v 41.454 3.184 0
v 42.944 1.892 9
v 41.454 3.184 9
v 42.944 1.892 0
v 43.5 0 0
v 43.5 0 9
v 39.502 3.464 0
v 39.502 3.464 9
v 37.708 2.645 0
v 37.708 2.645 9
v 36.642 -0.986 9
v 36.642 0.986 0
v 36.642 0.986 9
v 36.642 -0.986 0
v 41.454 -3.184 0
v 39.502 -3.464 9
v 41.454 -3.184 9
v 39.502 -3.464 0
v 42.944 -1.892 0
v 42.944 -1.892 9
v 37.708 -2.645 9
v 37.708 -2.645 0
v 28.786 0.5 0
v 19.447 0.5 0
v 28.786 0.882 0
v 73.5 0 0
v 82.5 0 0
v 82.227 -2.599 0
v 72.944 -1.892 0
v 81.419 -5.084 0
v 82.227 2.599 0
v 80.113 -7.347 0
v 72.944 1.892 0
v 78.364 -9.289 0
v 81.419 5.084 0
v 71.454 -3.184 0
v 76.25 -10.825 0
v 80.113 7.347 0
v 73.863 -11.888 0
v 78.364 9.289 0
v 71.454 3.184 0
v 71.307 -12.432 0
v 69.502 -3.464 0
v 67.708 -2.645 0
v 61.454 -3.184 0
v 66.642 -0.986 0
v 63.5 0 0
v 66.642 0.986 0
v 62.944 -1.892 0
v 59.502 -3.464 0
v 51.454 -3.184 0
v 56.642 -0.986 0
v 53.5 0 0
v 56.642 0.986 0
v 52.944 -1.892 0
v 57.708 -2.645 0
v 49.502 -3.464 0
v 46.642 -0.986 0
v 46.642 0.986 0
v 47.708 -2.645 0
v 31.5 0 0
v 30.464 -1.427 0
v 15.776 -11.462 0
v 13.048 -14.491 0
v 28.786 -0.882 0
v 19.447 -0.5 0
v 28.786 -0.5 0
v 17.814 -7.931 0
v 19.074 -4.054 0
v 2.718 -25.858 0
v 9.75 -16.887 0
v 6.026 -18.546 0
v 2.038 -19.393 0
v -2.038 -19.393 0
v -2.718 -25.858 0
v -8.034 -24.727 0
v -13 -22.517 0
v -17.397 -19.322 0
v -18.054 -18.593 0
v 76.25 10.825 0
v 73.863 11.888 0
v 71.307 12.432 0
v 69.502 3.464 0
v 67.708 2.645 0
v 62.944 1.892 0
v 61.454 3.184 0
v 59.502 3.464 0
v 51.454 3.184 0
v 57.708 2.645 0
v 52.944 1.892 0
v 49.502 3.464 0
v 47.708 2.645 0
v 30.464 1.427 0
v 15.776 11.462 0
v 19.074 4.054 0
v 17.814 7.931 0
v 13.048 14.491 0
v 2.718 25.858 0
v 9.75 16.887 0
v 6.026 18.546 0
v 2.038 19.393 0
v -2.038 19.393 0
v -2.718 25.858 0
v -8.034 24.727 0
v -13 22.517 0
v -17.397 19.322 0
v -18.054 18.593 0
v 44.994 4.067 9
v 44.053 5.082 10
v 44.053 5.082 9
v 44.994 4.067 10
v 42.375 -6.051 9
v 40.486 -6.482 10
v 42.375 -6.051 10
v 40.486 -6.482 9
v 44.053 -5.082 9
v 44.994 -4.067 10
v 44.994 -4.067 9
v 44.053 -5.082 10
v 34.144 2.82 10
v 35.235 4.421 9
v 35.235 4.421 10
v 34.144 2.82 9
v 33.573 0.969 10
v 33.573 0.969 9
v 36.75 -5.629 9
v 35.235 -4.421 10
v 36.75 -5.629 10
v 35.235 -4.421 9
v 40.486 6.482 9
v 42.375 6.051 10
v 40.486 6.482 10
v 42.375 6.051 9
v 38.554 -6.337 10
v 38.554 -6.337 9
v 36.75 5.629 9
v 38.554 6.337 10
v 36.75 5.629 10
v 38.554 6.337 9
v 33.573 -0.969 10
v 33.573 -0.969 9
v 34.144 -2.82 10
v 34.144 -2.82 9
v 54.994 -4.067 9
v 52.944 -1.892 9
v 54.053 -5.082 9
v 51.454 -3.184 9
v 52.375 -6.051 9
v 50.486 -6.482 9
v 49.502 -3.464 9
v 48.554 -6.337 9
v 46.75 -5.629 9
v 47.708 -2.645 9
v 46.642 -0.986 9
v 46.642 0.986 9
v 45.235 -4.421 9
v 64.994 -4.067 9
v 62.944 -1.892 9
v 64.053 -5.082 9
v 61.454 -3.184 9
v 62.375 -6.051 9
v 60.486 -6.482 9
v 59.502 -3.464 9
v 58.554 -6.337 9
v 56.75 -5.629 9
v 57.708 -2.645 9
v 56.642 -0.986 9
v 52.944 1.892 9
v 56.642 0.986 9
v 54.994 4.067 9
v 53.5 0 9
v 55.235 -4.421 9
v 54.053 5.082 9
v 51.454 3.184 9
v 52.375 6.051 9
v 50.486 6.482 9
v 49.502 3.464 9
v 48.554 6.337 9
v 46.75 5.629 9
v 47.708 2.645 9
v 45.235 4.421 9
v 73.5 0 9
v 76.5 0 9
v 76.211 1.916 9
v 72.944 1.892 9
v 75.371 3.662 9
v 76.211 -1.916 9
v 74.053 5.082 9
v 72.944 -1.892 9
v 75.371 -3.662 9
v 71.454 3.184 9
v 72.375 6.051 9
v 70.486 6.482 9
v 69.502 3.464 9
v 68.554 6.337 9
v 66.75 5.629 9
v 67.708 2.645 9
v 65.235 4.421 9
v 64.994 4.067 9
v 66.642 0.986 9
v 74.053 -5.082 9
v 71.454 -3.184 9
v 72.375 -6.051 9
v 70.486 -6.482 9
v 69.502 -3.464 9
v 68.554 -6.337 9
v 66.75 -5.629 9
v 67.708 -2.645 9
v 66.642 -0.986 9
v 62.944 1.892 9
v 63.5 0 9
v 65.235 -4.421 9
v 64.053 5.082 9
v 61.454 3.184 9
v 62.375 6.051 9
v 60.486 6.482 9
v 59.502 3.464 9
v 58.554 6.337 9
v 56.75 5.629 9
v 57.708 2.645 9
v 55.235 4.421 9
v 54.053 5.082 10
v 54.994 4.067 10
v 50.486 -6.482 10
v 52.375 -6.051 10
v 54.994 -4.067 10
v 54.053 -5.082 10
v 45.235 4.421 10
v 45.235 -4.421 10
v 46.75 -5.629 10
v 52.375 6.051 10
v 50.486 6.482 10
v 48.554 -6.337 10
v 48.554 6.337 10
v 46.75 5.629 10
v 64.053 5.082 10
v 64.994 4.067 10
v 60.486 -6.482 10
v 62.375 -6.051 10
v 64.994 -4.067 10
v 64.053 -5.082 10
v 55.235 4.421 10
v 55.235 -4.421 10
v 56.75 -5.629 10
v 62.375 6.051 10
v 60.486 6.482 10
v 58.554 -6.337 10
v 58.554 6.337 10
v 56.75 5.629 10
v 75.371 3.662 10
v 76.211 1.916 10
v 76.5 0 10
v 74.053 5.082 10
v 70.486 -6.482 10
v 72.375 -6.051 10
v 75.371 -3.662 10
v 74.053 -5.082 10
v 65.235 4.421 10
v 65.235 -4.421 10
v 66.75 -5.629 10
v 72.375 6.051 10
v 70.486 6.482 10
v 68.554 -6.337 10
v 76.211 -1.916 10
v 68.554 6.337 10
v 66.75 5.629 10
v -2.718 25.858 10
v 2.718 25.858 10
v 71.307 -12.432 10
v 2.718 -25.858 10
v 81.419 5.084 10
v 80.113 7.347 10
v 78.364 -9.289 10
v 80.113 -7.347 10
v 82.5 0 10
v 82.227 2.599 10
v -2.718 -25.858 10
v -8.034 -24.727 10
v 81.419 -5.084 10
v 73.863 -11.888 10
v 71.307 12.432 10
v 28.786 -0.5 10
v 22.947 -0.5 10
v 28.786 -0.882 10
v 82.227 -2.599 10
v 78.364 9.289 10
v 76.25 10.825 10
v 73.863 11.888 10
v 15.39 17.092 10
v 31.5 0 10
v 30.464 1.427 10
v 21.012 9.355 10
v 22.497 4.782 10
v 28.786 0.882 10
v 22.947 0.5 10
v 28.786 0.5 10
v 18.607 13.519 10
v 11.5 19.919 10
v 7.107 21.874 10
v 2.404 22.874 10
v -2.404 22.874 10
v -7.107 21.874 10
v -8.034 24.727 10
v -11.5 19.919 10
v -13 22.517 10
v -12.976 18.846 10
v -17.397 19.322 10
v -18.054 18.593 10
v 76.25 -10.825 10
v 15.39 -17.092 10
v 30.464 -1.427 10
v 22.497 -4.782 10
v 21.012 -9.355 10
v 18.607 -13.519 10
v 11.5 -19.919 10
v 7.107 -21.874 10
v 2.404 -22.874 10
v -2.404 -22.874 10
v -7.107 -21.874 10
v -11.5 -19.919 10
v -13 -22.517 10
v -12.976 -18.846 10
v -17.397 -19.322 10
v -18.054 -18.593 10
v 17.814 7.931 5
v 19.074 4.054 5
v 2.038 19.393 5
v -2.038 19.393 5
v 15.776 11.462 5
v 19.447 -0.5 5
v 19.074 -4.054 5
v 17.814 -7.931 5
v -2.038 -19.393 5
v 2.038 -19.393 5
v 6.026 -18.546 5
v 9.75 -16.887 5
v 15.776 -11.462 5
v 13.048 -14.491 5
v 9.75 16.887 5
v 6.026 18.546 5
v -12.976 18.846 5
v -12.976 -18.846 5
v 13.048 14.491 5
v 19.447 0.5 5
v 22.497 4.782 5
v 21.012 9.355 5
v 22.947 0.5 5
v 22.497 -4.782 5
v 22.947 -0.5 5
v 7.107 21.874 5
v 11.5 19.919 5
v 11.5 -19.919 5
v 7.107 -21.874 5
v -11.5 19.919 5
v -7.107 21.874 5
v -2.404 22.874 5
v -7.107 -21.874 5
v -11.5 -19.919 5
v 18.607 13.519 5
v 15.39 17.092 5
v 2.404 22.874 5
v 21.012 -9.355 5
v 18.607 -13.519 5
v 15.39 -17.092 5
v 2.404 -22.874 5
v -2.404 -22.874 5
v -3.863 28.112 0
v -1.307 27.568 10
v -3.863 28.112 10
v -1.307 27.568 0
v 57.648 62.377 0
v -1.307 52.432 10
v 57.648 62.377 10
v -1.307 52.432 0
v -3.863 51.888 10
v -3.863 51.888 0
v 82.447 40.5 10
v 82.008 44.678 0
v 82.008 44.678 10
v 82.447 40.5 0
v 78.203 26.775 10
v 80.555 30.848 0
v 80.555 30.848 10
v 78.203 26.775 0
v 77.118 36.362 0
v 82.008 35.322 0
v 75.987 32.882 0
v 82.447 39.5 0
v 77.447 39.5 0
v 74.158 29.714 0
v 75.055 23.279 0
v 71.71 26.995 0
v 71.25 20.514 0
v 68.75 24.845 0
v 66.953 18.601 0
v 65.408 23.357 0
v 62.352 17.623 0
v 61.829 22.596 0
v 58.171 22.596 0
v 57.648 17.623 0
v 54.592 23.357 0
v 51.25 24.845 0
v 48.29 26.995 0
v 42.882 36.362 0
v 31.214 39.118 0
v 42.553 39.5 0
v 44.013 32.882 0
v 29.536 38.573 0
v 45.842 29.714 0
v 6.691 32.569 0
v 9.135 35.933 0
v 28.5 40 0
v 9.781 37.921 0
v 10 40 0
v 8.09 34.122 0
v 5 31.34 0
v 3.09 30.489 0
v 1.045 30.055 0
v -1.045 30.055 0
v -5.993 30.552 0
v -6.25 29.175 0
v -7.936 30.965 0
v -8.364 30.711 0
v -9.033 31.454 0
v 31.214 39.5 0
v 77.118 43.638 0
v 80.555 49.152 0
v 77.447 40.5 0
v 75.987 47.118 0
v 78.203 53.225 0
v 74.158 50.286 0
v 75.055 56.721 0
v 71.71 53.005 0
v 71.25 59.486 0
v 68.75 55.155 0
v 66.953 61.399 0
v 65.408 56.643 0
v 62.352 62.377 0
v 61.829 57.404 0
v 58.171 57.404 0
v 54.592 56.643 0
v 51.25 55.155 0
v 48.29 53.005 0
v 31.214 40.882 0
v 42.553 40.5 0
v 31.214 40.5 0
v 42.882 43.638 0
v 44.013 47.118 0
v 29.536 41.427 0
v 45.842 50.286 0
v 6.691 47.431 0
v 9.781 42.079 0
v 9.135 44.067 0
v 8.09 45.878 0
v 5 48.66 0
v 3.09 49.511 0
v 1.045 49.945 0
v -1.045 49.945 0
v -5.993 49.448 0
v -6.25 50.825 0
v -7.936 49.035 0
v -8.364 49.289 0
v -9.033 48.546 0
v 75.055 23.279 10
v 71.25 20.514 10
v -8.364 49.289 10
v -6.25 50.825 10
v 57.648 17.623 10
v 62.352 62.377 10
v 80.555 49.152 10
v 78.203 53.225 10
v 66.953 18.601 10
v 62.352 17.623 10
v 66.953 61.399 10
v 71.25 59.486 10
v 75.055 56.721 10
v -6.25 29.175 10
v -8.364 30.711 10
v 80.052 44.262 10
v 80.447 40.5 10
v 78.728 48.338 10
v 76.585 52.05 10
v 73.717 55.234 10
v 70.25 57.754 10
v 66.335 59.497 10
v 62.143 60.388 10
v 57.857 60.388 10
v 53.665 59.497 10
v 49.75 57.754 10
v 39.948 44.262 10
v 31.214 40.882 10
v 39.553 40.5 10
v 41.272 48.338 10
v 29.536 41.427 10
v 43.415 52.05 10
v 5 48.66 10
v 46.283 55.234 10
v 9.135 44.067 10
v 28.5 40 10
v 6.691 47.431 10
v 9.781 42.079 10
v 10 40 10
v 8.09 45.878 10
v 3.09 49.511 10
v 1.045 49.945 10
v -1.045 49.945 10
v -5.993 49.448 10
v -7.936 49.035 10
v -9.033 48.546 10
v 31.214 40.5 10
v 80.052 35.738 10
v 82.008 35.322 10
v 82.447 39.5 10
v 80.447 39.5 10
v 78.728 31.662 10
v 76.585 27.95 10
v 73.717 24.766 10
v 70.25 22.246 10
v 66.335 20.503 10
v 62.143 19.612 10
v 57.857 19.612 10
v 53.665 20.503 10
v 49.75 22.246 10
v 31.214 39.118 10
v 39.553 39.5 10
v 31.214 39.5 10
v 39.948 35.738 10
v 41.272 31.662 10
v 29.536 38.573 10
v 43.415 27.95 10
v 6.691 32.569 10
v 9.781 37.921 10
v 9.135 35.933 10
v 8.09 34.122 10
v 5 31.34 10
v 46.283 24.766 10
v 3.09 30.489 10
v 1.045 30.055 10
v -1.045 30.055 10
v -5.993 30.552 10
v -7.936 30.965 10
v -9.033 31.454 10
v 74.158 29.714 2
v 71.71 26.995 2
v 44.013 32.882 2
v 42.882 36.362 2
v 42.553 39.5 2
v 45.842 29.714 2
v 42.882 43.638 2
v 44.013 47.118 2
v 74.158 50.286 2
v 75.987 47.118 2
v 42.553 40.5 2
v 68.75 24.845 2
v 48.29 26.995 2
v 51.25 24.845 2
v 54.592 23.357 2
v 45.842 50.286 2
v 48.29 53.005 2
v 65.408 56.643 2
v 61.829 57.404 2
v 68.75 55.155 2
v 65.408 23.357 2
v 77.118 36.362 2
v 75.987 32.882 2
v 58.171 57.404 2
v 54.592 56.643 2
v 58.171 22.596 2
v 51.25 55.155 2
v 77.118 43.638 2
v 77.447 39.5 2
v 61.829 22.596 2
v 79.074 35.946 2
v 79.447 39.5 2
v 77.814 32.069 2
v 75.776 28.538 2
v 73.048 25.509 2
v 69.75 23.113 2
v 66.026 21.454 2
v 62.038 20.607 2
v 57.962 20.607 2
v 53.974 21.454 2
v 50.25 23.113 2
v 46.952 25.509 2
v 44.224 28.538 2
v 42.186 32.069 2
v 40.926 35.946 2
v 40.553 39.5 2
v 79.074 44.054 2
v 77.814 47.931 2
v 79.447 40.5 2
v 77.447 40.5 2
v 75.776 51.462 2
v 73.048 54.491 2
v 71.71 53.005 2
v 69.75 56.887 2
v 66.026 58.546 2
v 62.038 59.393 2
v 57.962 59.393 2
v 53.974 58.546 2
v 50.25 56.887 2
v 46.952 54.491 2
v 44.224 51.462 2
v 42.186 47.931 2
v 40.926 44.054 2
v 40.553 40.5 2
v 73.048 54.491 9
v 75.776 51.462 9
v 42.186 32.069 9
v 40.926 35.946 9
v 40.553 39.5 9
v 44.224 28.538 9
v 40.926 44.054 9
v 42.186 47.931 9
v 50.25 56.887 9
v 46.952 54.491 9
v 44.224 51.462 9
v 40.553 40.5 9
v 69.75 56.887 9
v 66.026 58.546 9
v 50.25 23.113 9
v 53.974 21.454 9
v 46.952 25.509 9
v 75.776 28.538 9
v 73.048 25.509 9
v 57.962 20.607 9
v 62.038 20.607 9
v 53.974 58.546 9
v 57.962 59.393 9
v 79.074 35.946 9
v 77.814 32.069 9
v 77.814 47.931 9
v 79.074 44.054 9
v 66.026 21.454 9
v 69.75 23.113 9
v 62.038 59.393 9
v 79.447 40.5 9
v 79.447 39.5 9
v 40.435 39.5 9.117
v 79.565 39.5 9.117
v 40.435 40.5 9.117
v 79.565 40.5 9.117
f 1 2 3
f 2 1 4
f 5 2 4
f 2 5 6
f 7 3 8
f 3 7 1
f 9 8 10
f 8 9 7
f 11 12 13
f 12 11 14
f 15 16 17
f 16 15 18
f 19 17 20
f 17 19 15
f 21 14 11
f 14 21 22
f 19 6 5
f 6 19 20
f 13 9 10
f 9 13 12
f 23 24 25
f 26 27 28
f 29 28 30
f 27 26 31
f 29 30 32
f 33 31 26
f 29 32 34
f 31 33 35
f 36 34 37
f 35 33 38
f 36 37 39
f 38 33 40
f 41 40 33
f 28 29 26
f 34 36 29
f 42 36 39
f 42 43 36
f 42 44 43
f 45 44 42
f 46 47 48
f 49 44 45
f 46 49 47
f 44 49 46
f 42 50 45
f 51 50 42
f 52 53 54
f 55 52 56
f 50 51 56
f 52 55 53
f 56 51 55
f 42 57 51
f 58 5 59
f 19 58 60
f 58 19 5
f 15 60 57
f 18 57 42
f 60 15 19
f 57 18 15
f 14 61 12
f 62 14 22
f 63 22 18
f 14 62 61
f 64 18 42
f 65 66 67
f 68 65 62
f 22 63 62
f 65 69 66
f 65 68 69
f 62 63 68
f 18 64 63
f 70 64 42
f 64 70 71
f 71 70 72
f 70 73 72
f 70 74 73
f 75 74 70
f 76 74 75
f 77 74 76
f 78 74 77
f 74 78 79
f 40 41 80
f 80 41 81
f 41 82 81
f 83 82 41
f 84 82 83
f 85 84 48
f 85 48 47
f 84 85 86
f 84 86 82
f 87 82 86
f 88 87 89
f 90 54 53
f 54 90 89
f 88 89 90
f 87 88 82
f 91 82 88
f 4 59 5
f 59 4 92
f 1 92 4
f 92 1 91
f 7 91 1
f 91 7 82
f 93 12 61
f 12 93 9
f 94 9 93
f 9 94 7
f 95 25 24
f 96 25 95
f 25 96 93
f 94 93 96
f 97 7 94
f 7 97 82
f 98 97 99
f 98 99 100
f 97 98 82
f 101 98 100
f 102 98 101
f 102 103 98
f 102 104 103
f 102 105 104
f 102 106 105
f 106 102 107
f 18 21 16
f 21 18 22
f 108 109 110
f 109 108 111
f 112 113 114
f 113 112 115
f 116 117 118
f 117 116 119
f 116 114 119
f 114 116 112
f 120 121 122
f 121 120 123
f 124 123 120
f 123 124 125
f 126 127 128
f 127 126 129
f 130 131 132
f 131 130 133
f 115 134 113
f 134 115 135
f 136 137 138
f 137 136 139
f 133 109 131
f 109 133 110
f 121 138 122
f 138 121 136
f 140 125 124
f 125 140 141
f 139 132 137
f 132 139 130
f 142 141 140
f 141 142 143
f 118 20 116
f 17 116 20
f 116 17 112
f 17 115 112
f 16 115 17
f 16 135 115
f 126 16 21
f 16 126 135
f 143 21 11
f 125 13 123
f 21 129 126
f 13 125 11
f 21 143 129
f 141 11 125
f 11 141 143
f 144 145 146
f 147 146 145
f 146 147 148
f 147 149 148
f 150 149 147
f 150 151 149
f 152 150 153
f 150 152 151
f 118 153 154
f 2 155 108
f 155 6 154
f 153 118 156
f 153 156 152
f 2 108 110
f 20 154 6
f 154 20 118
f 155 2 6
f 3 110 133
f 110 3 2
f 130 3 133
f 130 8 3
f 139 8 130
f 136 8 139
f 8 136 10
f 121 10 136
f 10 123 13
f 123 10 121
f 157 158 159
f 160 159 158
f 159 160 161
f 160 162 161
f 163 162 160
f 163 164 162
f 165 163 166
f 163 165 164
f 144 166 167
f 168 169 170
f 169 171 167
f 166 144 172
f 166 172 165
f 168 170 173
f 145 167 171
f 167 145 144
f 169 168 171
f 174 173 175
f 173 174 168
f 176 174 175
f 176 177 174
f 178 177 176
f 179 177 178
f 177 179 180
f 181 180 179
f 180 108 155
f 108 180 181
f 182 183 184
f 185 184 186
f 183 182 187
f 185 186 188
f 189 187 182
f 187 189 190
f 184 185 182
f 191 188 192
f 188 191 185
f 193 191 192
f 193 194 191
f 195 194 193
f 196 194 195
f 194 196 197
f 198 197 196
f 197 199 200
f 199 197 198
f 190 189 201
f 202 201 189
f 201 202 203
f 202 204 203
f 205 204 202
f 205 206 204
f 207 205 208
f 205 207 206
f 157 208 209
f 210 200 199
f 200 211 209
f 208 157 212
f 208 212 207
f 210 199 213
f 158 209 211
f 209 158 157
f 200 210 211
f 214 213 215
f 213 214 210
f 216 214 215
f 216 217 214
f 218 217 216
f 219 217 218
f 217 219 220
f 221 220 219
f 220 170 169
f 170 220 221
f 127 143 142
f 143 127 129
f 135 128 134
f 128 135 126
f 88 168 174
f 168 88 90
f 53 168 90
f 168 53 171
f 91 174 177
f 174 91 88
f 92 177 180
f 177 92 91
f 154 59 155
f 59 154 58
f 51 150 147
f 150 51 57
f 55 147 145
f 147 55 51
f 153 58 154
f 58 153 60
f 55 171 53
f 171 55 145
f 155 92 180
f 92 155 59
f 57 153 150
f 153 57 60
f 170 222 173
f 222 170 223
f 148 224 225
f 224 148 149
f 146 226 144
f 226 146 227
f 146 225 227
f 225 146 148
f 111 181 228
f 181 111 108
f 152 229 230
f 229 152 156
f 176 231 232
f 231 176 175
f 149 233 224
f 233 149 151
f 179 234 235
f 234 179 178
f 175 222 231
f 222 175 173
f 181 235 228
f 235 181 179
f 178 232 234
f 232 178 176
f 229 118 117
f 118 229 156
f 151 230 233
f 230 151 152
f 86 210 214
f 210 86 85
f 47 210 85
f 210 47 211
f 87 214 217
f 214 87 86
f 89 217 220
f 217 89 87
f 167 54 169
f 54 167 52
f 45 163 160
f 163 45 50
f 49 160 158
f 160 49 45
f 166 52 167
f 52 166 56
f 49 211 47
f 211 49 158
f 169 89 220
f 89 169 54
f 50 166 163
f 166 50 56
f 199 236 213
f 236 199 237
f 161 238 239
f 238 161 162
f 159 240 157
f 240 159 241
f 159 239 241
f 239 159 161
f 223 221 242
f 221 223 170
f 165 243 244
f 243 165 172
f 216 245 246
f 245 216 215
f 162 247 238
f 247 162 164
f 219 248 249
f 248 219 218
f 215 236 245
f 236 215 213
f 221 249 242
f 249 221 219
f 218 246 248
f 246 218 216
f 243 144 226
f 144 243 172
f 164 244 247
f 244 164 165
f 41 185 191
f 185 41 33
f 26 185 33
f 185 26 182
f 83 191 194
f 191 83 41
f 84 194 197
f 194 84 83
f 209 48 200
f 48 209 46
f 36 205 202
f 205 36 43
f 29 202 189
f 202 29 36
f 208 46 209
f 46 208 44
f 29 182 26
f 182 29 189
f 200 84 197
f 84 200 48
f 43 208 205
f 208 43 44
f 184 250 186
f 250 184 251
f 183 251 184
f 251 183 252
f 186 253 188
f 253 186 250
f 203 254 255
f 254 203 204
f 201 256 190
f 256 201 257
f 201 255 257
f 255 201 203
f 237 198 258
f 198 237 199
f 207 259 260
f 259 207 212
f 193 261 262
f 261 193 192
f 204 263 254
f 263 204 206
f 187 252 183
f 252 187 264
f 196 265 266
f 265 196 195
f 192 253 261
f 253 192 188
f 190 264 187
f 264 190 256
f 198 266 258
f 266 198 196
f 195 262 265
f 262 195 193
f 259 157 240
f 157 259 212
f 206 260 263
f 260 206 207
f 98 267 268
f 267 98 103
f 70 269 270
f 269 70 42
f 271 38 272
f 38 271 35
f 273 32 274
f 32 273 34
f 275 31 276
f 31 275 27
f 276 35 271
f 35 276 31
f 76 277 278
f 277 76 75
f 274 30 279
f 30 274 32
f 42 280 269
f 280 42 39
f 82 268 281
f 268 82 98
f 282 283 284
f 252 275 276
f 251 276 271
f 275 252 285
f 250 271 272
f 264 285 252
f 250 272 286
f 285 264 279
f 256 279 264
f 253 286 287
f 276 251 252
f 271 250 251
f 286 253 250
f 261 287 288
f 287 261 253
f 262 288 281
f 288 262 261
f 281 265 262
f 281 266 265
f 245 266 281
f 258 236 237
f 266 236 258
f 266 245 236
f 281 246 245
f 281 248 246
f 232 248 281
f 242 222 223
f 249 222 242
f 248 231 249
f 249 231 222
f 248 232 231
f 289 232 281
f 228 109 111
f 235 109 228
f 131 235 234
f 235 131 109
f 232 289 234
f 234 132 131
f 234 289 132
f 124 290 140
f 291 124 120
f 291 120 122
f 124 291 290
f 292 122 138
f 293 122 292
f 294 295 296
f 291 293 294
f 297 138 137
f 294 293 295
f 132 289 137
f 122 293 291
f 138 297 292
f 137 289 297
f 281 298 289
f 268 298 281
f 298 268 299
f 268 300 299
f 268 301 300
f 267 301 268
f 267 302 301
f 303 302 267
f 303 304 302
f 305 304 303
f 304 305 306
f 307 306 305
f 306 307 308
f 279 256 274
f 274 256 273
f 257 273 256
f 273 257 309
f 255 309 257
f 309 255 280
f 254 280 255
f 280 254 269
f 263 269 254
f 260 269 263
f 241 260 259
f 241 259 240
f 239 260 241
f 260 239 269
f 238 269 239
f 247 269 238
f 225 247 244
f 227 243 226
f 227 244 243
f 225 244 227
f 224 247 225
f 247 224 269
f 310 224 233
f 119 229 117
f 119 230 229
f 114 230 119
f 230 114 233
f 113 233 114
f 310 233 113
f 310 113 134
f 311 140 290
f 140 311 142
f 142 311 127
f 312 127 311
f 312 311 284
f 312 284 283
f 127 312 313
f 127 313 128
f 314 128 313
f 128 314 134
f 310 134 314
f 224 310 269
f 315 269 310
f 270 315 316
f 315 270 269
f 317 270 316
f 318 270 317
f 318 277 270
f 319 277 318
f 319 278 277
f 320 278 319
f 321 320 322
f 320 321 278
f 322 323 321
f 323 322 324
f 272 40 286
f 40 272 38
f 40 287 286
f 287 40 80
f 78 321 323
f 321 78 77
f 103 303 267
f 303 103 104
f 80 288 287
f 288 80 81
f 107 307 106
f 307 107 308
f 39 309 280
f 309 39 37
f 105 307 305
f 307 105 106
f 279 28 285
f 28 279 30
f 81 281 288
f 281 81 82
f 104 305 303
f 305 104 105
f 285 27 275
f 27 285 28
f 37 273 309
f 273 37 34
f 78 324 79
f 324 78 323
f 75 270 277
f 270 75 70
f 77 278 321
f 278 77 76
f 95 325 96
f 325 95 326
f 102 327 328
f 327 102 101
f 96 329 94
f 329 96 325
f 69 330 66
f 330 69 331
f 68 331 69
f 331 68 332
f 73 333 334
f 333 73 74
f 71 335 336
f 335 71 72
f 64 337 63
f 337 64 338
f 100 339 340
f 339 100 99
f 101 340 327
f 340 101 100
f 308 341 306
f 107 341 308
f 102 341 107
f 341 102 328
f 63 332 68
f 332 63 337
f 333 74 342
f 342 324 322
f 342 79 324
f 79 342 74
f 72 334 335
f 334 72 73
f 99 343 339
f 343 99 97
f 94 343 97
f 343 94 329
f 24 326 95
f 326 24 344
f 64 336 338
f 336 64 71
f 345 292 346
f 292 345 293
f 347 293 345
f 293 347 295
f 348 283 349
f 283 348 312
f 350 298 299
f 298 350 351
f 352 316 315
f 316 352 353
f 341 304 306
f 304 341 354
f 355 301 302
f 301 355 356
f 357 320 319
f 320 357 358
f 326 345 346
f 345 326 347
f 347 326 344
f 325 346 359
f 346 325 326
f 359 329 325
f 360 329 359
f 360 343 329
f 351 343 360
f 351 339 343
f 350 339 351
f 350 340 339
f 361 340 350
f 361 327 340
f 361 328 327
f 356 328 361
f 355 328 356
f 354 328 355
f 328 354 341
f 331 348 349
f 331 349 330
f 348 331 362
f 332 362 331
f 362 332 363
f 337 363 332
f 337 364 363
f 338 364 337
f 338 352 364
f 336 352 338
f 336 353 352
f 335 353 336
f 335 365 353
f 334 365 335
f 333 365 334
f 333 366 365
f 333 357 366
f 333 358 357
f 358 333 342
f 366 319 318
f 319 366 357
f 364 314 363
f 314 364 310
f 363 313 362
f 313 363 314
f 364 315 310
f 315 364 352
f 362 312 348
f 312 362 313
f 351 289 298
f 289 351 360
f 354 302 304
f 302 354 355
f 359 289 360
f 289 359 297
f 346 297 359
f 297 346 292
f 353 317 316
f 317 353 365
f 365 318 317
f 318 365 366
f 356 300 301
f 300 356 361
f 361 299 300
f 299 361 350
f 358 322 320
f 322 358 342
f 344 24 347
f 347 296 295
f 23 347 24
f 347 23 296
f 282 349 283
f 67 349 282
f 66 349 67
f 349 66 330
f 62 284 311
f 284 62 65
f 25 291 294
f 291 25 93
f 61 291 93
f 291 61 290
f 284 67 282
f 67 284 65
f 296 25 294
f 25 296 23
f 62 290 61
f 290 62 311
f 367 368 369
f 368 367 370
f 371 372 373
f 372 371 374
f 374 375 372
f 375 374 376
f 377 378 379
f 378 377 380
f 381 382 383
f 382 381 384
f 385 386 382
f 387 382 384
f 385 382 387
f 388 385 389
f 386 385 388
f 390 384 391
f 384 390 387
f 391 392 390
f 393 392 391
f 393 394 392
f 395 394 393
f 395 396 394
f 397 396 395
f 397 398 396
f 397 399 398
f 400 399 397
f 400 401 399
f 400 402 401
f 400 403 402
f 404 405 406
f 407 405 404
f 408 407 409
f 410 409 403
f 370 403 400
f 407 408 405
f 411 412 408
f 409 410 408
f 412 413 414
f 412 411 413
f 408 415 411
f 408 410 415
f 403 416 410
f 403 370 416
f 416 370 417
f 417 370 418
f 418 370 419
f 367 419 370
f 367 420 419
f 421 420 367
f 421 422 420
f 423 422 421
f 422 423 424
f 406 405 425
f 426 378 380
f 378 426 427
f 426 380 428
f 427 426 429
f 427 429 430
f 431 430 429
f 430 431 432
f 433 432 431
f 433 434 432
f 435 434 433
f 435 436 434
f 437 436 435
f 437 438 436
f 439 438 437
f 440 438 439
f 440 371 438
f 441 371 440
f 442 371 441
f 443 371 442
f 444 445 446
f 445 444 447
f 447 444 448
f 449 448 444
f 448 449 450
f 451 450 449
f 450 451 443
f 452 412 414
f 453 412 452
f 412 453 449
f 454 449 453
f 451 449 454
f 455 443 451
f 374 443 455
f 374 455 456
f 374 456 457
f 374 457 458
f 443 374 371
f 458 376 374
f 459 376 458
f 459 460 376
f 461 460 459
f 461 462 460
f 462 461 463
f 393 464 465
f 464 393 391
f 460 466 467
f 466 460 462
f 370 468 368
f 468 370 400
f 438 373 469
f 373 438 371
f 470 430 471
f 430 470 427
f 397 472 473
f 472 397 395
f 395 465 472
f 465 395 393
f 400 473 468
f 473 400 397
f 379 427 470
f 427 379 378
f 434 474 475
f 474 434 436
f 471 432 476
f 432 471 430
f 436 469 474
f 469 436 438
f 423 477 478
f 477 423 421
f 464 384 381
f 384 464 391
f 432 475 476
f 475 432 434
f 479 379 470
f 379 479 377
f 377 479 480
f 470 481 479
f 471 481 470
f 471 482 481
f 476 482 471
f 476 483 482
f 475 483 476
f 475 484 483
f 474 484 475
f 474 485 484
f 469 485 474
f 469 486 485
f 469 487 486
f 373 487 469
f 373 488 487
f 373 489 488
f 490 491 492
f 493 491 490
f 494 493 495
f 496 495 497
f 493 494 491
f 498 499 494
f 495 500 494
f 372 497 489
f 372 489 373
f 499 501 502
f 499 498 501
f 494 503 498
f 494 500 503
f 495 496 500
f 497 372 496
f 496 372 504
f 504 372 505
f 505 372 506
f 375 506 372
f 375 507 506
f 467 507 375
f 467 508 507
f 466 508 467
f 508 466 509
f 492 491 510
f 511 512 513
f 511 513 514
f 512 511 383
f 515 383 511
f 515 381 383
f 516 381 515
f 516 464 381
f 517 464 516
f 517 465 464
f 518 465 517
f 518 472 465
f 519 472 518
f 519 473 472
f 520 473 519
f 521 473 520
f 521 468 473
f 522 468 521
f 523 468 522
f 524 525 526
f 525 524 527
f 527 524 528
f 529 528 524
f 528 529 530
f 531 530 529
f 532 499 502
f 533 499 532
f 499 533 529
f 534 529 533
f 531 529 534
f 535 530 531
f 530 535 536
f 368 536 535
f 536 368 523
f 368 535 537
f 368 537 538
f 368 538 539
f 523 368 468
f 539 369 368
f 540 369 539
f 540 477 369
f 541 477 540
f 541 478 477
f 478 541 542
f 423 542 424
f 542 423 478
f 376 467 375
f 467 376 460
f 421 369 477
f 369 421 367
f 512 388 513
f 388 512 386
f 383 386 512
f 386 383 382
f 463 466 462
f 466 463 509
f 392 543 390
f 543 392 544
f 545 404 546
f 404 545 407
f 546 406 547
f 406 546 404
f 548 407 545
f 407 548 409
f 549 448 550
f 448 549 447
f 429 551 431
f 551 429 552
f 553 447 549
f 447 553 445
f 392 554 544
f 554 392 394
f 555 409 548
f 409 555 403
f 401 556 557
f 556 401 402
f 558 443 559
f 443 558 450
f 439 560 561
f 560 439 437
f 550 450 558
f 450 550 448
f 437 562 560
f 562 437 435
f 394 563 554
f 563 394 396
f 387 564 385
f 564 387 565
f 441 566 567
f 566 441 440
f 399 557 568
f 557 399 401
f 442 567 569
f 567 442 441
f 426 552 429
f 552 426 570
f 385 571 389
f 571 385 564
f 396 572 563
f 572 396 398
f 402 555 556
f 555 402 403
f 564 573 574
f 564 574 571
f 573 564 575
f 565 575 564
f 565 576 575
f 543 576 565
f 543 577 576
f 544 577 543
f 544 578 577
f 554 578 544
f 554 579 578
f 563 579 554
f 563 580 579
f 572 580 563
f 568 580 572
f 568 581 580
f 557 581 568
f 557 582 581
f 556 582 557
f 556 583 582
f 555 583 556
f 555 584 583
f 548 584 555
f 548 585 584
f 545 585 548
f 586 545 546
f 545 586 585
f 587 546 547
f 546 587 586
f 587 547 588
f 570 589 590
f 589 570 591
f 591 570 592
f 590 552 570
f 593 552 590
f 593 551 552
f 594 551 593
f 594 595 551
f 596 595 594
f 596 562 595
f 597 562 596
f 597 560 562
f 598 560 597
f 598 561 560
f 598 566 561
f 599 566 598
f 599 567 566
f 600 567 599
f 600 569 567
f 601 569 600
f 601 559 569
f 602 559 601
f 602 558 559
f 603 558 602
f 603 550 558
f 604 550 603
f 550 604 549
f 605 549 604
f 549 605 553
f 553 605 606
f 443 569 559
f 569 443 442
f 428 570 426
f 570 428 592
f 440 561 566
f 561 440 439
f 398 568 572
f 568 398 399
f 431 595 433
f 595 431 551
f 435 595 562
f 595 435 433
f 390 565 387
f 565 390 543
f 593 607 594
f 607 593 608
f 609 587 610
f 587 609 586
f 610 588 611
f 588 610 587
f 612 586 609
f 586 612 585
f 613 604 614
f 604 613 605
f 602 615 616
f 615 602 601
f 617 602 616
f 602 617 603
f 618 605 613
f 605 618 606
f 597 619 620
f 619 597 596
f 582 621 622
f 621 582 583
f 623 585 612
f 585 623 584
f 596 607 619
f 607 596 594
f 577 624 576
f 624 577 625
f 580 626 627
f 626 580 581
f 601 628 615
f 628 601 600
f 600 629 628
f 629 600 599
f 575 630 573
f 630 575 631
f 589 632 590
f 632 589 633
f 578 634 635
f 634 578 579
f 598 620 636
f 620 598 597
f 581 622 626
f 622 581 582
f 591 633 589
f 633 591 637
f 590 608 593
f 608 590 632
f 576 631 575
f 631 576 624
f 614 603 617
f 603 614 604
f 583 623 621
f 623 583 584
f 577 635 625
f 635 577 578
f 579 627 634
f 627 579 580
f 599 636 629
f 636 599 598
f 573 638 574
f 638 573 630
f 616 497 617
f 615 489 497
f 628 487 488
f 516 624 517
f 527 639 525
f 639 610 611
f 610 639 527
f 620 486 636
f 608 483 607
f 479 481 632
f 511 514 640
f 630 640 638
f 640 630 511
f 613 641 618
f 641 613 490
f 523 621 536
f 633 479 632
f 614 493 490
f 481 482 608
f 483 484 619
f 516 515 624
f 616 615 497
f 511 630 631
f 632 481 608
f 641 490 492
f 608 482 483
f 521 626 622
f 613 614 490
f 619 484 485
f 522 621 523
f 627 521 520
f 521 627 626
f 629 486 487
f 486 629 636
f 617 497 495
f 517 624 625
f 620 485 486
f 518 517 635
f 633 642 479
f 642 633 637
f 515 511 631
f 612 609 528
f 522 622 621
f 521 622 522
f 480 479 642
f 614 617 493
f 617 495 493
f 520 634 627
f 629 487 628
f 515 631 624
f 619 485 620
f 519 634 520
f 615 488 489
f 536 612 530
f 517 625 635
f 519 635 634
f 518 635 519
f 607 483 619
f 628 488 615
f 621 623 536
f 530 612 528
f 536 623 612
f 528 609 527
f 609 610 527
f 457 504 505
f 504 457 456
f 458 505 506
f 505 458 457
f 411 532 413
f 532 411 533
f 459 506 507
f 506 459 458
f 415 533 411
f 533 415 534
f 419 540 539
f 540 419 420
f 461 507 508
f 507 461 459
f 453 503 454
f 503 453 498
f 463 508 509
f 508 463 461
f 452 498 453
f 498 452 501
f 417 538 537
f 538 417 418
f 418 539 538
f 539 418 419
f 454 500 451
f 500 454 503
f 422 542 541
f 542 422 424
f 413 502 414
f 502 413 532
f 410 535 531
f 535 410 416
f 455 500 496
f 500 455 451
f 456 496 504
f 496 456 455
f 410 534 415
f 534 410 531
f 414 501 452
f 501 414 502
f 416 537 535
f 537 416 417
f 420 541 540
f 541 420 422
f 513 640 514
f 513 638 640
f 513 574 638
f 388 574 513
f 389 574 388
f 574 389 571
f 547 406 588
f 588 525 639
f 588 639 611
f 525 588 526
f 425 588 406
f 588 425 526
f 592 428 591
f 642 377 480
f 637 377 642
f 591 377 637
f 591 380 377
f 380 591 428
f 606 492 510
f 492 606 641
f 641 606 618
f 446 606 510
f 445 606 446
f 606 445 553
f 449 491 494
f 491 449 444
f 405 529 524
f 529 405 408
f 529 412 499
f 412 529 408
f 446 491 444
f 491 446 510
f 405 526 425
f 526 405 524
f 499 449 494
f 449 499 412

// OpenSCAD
difference() {
    hull() {
        cylinder(h=10,d=52);
        translate([70,0,0]) cylinder(h=10,d=25);
    }
    hull() {
        cylinder(h=10,d=39);
        translate([-20,0,0]) cylinder(h=10,d=37);
    }
    for (x = [40,50,60,70]) {
        translate([x,0,0]) cylinder(h=10,d=7);
        translate([x,0,9]) cylinder(h=10,d=13);
    }
    
    translate([0,0,5]) cylinder(h=5,d=46);
    translate([0,0,5]) cube([60,1,10],center=true);
    translate([30,0,0]) cylinder(d=3,h=10);
}
    
translate([60,40,0]) rotate([0,0,180])    
difference() {
    hull() {
        cylinder(h=10,d=45);
        translate([60,0,0]) cylinder(h=10,d=25);
    }
    cylinder(h=2,d=35);
    translate([0,0,2]) cylinder(h=10,d=39);
    translate([0,0,9]) cylinder(h=1,d1=39,d2=41);
    hull() {
        translate([60,0,0]) cylinder(h=10,d=20);
        translate([65,0,0]) cylinder(h=10,d=19);
    }
    translate([0,0,5]) cube([60,1,10],center=true);
    translate([30,0,0]) cylinder(d=3,h=10);
}
